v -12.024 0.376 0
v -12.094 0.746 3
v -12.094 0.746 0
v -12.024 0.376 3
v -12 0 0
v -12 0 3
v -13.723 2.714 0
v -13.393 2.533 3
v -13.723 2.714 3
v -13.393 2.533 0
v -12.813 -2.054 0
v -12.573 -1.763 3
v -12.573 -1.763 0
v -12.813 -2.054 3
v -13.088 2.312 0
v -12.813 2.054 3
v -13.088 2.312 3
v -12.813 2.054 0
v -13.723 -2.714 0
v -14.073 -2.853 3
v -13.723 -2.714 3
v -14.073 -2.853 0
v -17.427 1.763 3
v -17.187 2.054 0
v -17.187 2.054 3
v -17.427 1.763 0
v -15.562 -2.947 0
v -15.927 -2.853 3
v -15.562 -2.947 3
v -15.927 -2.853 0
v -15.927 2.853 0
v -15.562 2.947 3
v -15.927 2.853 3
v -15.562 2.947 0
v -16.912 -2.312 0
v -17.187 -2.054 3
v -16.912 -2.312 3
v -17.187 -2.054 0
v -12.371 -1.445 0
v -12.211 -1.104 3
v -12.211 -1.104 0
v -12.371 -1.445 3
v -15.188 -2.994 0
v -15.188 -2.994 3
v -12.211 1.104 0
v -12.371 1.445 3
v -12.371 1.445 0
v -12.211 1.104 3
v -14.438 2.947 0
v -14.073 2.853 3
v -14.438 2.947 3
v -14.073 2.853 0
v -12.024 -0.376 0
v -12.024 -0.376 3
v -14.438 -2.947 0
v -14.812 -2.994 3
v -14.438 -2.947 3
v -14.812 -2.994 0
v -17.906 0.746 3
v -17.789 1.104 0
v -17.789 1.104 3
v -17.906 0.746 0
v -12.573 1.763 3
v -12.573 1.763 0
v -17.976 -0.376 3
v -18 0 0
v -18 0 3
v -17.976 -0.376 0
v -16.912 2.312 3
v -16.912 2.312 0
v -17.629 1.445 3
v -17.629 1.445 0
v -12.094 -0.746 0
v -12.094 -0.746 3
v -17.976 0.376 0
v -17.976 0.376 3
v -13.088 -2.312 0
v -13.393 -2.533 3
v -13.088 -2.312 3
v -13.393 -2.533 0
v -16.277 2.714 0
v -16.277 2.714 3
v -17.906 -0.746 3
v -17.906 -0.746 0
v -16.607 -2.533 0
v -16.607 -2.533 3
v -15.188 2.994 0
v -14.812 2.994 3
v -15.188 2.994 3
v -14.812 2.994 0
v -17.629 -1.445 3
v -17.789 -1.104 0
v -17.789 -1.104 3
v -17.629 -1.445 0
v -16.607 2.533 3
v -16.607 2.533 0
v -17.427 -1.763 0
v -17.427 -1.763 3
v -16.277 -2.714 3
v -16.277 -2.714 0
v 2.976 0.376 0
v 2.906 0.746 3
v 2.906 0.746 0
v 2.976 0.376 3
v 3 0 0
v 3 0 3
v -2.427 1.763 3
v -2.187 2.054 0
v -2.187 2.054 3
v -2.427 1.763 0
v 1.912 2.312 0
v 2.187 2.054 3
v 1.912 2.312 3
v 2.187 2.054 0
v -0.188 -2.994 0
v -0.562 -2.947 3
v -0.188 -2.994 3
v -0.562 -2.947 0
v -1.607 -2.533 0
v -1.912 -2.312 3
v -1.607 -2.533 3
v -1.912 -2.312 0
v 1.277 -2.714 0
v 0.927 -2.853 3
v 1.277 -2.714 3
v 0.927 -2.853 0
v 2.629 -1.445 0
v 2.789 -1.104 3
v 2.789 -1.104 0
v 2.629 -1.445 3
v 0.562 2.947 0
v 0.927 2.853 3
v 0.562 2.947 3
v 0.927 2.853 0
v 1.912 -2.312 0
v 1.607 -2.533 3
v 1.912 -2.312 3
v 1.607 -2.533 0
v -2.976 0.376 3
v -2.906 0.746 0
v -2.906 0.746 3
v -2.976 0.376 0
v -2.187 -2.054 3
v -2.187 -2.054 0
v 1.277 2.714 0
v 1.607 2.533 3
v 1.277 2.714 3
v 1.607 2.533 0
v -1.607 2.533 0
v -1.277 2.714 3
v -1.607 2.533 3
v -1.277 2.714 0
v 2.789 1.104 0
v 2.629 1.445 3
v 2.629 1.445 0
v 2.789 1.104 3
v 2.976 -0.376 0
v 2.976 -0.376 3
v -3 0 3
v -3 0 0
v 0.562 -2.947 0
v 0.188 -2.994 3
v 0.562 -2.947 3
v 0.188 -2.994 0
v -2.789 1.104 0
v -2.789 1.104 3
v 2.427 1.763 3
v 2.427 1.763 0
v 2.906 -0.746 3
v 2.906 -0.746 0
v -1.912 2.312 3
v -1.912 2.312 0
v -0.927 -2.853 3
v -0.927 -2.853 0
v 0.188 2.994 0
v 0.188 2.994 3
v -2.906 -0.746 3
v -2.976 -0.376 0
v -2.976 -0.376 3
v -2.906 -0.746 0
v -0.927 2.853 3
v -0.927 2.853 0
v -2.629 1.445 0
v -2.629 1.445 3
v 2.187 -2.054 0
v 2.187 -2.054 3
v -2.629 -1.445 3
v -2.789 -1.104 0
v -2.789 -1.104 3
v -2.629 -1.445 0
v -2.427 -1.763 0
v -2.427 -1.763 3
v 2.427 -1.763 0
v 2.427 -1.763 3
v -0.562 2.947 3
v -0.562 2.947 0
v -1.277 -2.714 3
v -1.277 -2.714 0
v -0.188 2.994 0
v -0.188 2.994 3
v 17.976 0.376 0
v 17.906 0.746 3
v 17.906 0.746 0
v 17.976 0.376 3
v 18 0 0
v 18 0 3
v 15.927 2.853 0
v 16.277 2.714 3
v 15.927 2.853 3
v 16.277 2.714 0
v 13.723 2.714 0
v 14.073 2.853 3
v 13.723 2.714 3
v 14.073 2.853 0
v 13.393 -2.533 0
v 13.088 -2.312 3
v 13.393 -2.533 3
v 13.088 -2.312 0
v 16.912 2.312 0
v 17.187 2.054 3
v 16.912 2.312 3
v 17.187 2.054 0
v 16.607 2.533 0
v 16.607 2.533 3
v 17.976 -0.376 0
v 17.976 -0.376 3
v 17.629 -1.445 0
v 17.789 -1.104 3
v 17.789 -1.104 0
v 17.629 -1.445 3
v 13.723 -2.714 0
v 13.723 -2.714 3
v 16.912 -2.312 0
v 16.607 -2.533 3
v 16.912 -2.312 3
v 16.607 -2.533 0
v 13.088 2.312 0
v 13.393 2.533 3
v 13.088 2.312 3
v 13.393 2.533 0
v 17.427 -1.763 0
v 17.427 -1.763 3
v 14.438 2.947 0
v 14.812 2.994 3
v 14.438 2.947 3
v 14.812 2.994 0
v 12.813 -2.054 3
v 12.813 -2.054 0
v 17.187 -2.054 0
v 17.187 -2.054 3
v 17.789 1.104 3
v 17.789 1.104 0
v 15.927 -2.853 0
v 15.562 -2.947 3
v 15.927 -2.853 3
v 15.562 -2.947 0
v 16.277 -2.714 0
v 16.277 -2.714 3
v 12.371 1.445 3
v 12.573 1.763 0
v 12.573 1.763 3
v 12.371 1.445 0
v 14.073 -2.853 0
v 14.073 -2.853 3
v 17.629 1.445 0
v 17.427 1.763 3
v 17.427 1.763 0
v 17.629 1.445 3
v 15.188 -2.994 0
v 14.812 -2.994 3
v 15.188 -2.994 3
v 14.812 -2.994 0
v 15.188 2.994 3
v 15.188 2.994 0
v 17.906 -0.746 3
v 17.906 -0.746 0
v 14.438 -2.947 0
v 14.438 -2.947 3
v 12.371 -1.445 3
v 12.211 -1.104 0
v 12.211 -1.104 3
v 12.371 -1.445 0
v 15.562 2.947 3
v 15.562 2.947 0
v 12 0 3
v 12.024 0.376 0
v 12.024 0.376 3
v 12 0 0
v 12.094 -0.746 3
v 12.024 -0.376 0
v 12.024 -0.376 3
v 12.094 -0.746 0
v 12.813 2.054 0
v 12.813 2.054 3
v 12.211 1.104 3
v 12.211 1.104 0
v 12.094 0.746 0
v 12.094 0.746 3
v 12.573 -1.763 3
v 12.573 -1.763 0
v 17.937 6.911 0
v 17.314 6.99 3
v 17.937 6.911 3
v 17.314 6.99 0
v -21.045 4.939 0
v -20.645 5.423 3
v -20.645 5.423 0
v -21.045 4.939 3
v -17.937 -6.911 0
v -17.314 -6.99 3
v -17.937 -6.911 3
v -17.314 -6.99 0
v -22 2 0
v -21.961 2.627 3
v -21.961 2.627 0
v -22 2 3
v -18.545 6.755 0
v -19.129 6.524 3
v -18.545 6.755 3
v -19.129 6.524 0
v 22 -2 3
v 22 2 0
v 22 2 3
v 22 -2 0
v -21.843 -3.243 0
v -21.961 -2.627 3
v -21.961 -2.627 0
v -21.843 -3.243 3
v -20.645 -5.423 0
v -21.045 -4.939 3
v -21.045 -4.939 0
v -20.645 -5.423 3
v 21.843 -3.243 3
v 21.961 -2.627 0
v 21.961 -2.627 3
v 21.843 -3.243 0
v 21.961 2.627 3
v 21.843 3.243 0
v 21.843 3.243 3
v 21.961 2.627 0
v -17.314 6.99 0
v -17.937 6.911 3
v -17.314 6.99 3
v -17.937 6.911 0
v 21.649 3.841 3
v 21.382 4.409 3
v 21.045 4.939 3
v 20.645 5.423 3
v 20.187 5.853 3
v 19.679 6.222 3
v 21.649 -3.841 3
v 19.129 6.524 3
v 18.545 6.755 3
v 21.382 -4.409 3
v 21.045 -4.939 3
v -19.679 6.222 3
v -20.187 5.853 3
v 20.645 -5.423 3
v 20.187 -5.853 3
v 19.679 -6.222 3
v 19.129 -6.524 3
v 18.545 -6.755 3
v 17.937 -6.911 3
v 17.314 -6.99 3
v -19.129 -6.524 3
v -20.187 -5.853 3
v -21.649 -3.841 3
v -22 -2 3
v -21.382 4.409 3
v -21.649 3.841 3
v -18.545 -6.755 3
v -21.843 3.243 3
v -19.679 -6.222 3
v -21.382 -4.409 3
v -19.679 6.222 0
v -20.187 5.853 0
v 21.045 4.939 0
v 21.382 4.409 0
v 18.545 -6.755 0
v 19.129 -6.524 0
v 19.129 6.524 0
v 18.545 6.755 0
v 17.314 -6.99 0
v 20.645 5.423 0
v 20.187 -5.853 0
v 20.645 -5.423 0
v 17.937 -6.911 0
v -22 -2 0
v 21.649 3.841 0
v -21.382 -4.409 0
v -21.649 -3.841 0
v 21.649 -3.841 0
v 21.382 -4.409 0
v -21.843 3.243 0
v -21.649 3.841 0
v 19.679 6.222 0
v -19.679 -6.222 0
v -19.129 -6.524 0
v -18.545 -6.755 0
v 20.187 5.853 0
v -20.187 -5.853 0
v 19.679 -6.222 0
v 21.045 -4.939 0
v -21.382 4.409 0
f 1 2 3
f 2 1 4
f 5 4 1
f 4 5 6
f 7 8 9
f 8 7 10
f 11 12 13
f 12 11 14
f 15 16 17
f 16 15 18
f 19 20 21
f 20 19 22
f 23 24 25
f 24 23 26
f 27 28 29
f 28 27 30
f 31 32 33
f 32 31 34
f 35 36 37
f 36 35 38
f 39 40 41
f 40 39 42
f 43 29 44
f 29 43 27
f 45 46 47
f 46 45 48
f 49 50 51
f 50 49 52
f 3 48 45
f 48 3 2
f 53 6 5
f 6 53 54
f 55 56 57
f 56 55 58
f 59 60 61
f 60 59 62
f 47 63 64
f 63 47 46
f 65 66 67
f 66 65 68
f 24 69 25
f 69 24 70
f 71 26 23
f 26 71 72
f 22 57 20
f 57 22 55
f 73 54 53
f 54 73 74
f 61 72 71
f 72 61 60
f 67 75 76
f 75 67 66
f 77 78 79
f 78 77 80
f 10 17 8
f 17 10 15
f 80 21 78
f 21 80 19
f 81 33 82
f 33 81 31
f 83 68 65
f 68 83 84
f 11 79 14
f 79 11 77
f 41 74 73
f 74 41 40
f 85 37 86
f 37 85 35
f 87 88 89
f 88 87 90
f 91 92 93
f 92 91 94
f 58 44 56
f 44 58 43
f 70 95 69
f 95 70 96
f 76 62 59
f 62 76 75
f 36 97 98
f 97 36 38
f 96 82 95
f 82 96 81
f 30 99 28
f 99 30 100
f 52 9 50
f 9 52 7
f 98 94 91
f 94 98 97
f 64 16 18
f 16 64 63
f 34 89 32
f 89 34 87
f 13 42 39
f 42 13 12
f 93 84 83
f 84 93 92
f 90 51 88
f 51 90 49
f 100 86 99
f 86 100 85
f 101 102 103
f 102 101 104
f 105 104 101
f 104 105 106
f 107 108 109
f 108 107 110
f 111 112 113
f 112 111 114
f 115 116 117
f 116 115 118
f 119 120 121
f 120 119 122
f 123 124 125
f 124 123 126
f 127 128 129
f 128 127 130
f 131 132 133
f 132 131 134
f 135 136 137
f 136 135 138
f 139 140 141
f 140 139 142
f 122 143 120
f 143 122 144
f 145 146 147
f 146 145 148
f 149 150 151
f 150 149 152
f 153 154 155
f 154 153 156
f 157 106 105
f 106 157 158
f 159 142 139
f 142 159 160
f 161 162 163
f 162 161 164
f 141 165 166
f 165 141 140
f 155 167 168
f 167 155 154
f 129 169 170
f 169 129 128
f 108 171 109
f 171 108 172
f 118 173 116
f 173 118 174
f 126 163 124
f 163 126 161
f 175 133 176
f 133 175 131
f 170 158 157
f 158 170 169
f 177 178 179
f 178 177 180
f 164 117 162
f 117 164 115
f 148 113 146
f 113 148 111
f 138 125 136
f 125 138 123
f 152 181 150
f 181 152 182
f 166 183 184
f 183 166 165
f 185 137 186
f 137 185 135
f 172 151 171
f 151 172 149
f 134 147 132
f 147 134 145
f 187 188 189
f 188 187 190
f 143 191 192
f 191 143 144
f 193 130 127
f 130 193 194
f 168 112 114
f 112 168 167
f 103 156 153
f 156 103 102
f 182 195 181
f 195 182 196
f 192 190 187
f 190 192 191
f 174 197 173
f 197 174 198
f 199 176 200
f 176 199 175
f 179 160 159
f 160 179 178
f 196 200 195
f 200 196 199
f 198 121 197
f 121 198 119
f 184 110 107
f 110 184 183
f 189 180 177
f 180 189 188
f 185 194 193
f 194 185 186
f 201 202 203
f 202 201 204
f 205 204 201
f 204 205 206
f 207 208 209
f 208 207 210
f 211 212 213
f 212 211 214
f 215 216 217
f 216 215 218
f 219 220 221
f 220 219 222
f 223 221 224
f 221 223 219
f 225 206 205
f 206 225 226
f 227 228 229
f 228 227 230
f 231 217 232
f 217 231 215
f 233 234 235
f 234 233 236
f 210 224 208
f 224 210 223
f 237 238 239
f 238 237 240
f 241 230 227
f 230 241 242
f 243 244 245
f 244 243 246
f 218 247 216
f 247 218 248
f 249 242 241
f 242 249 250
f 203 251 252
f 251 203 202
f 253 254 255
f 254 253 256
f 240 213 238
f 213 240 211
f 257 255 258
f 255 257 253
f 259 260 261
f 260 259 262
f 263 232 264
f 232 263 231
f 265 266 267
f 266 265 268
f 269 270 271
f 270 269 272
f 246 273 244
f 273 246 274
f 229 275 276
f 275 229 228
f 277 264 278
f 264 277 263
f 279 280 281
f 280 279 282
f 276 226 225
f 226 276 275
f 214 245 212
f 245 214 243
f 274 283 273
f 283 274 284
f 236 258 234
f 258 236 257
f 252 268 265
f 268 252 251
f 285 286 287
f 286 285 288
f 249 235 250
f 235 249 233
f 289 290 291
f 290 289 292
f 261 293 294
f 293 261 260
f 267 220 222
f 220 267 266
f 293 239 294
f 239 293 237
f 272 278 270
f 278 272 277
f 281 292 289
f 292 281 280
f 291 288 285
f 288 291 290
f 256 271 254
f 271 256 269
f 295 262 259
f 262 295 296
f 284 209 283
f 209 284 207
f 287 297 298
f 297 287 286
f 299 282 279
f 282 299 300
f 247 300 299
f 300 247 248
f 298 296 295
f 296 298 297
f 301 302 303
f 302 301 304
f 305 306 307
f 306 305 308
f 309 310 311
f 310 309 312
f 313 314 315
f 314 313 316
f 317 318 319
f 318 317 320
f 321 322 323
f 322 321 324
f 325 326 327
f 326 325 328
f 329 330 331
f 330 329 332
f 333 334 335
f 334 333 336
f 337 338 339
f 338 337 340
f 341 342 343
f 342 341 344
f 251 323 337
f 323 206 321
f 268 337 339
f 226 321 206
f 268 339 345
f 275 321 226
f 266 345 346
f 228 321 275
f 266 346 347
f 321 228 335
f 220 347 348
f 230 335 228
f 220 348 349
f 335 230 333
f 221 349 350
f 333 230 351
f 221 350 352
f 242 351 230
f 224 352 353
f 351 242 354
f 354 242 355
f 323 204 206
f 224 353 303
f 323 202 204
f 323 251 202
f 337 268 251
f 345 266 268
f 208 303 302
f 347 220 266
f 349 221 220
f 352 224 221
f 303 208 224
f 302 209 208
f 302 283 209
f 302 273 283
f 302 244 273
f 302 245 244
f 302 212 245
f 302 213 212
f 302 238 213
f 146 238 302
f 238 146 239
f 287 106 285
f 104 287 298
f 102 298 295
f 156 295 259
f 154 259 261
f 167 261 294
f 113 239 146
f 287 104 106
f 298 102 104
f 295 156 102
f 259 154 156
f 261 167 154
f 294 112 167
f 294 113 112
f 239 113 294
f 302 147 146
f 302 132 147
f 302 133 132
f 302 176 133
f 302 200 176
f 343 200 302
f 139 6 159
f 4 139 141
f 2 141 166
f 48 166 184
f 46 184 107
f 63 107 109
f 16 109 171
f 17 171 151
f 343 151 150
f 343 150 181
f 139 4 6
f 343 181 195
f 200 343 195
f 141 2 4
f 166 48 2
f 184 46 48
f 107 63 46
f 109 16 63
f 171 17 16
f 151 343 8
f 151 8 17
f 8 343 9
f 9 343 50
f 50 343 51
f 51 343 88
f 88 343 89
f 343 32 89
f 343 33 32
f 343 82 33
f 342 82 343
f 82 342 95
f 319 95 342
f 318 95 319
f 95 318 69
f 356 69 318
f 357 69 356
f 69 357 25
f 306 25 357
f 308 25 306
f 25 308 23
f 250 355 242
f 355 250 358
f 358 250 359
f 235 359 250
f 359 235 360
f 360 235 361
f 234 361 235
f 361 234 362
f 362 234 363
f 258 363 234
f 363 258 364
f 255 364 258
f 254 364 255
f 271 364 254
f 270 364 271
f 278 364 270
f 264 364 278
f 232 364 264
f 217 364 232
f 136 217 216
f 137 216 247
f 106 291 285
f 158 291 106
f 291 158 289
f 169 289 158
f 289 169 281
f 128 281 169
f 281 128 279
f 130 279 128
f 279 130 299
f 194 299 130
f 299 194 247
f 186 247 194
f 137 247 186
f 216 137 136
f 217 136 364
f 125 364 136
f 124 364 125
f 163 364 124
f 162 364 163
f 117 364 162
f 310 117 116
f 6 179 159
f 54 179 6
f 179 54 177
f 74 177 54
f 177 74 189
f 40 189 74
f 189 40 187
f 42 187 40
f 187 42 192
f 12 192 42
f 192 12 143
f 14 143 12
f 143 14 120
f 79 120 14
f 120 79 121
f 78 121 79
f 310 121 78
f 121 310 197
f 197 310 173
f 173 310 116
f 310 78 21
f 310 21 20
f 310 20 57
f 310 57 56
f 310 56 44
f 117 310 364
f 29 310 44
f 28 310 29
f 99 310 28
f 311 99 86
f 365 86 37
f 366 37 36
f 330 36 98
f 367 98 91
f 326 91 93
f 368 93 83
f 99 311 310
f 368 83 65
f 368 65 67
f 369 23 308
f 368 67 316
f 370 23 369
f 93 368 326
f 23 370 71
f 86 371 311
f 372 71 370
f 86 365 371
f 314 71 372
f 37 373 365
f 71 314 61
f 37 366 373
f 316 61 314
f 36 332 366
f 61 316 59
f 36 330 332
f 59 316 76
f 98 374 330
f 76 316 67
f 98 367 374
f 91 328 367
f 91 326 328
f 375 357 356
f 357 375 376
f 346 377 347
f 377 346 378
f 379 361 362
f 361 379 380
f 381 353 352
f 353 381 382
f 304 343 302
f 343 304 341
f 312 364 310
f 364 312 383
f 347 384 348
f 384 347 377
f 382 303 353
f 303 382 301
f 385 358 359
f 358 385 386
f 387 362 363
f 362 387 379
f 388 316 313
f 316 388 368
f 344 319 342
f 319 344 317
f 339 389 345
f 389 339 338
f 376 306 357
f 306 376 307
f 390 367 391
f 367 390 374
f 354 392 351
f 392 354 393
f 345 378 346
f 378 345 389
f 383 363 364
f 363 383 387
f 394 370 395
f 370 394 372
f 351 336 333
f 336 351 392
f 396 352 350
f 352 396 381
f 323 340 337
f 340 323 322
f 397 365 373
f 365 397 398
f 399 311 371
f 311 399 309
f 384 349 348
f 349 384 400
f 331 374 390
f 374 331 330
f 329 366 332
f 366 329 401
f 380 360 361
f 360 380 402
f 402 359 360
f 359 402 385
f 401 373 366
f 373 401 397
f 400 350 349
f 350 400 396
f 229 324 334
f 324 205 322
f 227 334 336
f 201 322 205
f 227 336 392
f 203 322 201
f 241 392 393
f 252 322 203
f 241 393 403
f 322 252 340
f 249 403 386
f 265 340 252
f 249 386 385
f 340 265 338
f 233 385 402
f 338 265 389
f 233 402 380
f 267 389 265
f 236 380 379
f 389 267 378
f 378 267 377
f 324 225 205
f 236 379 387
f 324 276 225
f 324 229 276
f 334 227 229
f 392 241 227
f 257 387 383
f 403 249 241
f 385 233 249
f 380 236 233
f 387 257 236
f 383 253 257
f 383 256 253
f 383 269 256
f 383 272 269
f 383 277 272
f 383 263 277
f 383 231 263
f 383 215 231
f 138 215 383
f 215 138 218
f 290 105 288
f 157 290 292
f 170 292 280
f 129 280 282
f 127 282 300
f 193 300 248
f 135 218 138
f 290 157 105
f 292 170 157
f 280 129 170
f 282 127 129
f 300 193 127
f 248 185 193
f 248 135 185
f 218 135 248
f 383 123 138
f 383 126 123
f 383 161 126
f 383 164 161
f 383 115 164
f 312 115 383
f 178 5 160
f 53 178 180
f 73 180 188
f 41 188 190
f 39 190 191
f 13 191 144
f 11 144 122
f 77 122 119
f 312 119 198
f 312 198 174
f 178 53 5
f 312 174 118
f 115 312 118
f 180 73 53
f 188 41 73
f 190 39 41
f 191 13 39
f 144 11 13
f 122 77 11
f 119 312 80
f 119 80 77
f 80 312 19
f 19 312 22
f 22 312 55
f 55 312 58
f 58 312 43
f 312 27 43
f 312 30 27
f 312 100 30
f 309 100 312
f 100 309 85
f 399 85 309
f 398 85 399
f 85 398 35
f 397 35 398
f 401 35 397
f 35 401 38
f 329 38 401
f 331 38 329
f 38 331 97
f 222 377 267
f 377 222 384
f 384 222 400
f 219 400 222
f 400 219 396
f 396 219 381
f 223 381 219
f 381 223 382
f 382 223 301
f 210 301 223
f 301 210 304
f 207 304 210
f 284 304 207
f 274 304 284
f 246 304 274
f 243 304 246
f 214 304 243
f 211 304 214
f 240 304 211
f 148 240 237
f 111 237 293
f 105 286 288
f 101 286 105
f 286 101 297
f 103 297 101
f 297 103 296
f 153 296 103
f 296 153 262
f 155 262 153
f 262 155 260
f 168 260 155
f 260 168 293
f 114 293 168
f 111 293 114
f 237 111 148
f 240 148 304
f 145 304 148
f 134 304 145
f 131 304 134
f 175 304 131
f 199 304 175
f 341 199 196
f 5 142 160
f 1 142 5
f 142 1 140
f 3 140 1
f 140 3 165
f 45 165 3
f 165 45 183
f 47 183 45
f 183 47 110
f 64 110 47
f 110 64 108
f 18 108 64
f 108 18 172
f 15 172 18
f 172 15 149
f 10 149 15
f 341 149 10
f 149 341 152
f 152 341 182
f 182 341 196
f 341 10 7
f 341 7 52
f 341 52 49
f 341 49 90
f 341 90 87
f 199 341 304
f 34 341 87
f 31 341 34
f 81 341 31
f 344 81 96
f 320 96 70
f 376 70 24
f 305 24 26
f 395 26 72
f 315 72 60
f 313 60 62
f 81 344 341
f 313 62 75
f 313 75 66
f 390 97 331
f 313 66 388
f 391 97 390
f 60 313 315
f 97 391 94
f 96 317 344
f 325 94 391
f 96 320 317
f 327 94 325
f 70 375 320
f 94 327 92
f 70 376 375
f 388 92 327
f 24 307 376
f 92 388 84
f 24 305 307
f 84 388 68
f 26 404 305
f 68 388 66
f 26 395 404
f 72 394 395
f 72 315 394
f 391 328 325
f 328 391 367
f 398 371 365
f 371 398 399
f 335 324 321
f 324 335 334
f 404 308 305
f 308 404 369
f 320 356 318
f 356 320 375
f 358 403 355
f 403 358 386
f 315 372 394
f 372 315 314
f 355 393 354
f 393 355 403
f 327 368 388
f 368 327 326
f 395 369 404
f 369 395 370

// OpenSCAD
// Generated by SolidPython 1.1.3 on 2023-03-12 21:51:23
$fn = 50;


difference() {
	union() {
		translate(v = [0, 0, 0]) {
			rotate(a = [0, 0, 0]) {
				hull() {
					translate(v = [-17.0000000000, 2.0000000000, 0]) {
						rotate(a = [0, 0, 0]) {
							translate(v = [0, 0, 0]) {
								rotate(a = [0, 0, 0]) {
									cylinder(h = 3, r = 5);
								}
							}
						}
					}
					translate(v = [17.0000000000, 2.0000000000, 0]) {
						rotate(a = [0, 0, 0]) {
							translate(v = [0, 0, 0]) {
								rotate(a = [0, 0, 0]) {
									cylinder(h = 3, r = 5);
								}
							}
						}
					}
					translate(v = [-17.0000000000, -2.0000000000, 0]) {
						rotate(a = [0, 0, 0]) {
							translate(v = [0, 0, 0]) {
								rotate(a = [0, 0, 0]) {
									cylinder(h = 3, r = 5);
								}
							}
						}
					}
					translate(v = [17.0000000000, -2.0000000000, 0]) {
						rotate(a = [0, 0, 0]) {
							translate(v = [0, 0, 0]) {
								rotate(a = [0, 0, 0]) {
									cylinder(h = 3, r = 5);
								}
							}
						}
					}
				}
			}
		}
	}
	union() {
		translate(v = [-15.0000000000, 0.0000000000, 0]) {
			rotate(a = [0, 0, 0]) {
				translate(v = [0, 0, -50]) {
					rotate(a = [0, 0, 0]) {
						cylinder(h = 100, r = 3.0000000000);
					}
				}
			}
		}
		translate(v = [0.0000000000, 0.0000000000, 0]) {
			rotate(a = [0, 0, 0]) {
				translate(v = [0, 0, -50]) {
					rotate(a = [0, 0, 0]) {
						cylinder(h = 100, r = 3.0000000000);
					}
				}
			}
		}
		translate(v = [15.0000000000, 0.0000000000, 0]) {
			rotate(a = [0, 0, 0]) {
				translate(v = [0, 0, -50]) {
					rotate(a = [0, 0, 0]) {
						cylinder(h = 100, r = 3.0000000000);
					}
				}
			}
		}
	}
}
/***********************************************
*********      SolidPython code:      **********
************************************************
 
from solid import *
import os
import subprocess

import oomB

import opsc_library_gen

mode = "laser"
#mode = "3d_print"

defined_objects = {}

radius_dict = {}
countersunk_dict = {}


def set_mode(m):
    global mode
    mode = m
    radius_dict['M6'] = 6.5/2
    radius_dict['M3'] = 3.3/2
    if mode == "laser":
        radius_dict['M6'] = 6/2
        radius_dict['M3'] = 3/2

    countersunk_dict['M3'] = {}
    countersunk_dict['M3']['little_rad'] = radius_dict['M3']
    countersunk_dict['M3']['big_rad'] = (5.5+0.6)/2
    if mode == "laser":
        countersunk_dict['M3']['big_rad'] = (4.75+0.6)/2
        countersunk_dict['M3']['little_rad'] = (4.75+0.6)/2

    countersunk_dict['M3']['height'] = 1.7


def opsc_make_object(filename, objects, save_type="none",resolution=50, layers = 1, tilediff = 200, mode="laser", overwrite=True):
    if overwrite or not os.path.exists(filename):
        set_mode(mode)
        save_type = save_type.lower()
        os.makedirs(os.path.dirname(filename), exist_ok=True)
        final_object = opsc_get_object(objects, mode = mode)
        # Save the final object to the specified filename    
        scad_render_to_file(final_object, filename, file_header='$fn = %s;' % resolution, include_orig_code=True)
        if mode == "laser":
            filename_laser = filename.replace(".scad","-flat.scad")
            scad_render_to_file(getLaser(final_object, layers=layers, tilediff=tilediff), filename_laser, file_header='$fn = %s;' % resolution, include_orig_code=True)
            if save_type == "all":
                saveToAll(filename_laser)
            elif save_type == "dxf":
                saveToDxf(filename_laser)
        if save_type == "all":
            saveToAll(filename)
        elif save_type == "dxf":
            saveToDxf(filename)


def opsc_get_object(objects, mode = "laser"):
    # Create the solidpython objects only include the positive objects and if they don't have inclusion or their inclusion is either all or mode
    # Initialize an empty list to store the results
    positive_objects = []

    # Iterate over the "objects" list
    for obj in objects:
        # Check if the current object has a "type" key with a value of "positive"
        if obj['type'] == 'positive':
            # Check if the current object has an "inclusion" key and its value matches "mode",
            # or if the current object does not have an "inclusion" key at all
            if not 'inclusion' in obj or obj['inclusion'] == "all" or obj['inclusion'] == mode:
                # Call the "get_opsc_item" function with the current object as an argument
                opsc_item = get_opsc_item(obj)
                # Add the result to the "positive_objects" list
                positive_objects.append(opsc_item)
# Initialize an empty list to store the results
    negative_objects = []

    # Iterate over the "objects" list
    for obj in objects:
        # Check if the current object has a "type" key with a value of "negative"
        if obj['type'] == 'negative':
            # Check if the current object has an "inclusion" key and its value matches "mode",
            # or if the current object does not have an "inclusion" key at all
            if not 'inclusion' in obj or obj['inclusion'] == "all" or obj['inclusion'] == mode:
                # Call the "get_opsc_item" function with the current object as an argument
                opsc_item = get_opsc_item(obj)
                # Add the result to the "negative_objects" list
                negative_objects.append(opsc_item)
    
    #positive_objects = [get_opsc_item(obj) for obj in objects if obj['type'] == 'positive']
    #negative_objects = [get_opsc_item(obj) for obj in objects if obj['type'] == 'negative']
    # Union the positive objects
    positive_object = union()(*positive_objects)
    # Union the negative objects
    negative_object = union()(*negative_objects)
    # Create the final object by subtracting the negative objects from the positive objects
    return difference()(positive_object, negative_object)

def get_opsc_item(params):
    # A dictionary to map radius string values to numerical values
    #radius_dict = {'small': 5, 'medium': 10, 'large': 15}
    # An array of function names for basic shapes
    basic_shapes = ['cube', 'sphere', 'cylinder']
    
    # An array of function names for other shapes
    other_shapes = ['hole', 'slot', 'rounded_rectangle', 'countersunk']
    


    # Convert radius to r if present, and remove radius from the params dictionary
    if 'radius' in params:
        if isinstance(params['radius'], str):
            # Use the radius_dict to map the radius string value to a numerical value
            params['r'] = radius_dict[params['radius']]
        else:
            params['r'] = params['radius']
        del params['radius']
    

    # Check if the object type is a basic shape
    if params['shape'] in basic_shapes:
        # Remove shape and unexpected dictionary values
        allowed_keys = {'size', 'r', 'r1', 'r2', 'd', 'h', 'rw', 'rh', 'dw', 'dh'}
        shape_params = {k: v for k, v in params.items() if k in allowed_keys}

        # Call the corresponding function for the shape parameter, using ** notation to pass the shape_params dictionary as keyword arguments
        return get_opsc_transform(params,globals()[params['shape']](**shape_params))
    
    # If the object type is not a basic shape, check if it's a defined object or one of the other shapes
    elif params['shape'] in other_shapes:
        # Call the corresponding function for the shape parameter, passing the params dictionary as an argument
        p2 = copy.deepcopy(params)
        p2["pos"] = [0,0,0]
        return get_opsc_transform(params,globals()[params['shape']](p2))
    
    # If the object is not a basic shape or a defined object, try to import it from a .scad file
    else:
        obj = defined_objects[params['shape']]
        return get_opsc_transform(params,obj)

def get_opsc_transform(params, solid_obj):
    # Rotate the object based on the 'rot' field in the params dictionary, or the 'rotX', 'rotY', and 'rotZ' fields if 'rot' is not present
    rot = params.get('rot', [])
    if rot:
        rotX, rotY, rotZ = rot
    else:
        rotX = params.get('rotX', 0)
        rotY = params.get('rotY', 0)
        rotZ = params.get('rotZ', 0)
    solid_obj = rotate([rotX, rotY, rotZ])(solid_obj)

    # Translate the object based on the 'pos' field in the params dictionary, or the 'x', 'y', and 'z' fields if 'pos' is not present
    pos = params.get('pos', [])
    if pos:
        x, y, z = pos
    else:
        x = params.get('x', 0)
        y = params.get('y', 0)
        z = params.get('z', 0)
    solid_obj = translate([x, y, z])(solid_obj)
    return solid_obj


import random

def opsc_easy_array(type, shape, repeats, pos_start, shift_arr, **kwargs):
    for i in range(0,3):
        repeats.append(1)
        pos_start.append(0)
        shift_arr.append(0)
    return_objects = []

    for x in range(0,repeats[0]):
        for y in range(0,repeats[1]):
            for z in range(0,repeats[2]):
                return_objects.append(opsc_easy(type, shape, pos=[pos_start[0]+x*shift_arr[0],pos_start[1]+y*shift_arr[1],pos_start[2]+z*shift_arr[2]], **kwargs))
    return return_objects                



def opsc_easy(type, shape, **kwargs):
    obj = {
        'type': type,
        'shape': shape
    }
    for param in ['size', 'r', 'r1', 'r2', 'd', 'h', 'rw', 'rh', 'dw', 'dh', 'pos', 'x', 'y', 'z', 'rot', 'rotX', 'rotY', 'rotZ', "w", "inclusion"]:
        if param in kwargs:
            obj[param] = kwargs[param]
    return obj

def hole(params):
    p2 = copy.deepcopy(params)  
    # Check if the radius is a string and replace it with the corresponding value from the dictionary
    if isinstance(p2['r'], str):
        p2['r'] = radius_dict[p2['r']]
    
    # Set the height to 100 if not specified
    if 'h' not in p2:
        p2['h'] = 100
        p2["pos"] = [0,0,-50]
    p2["center"] = True
    # Create the cylinder object
    p2["shape"] = "cylinder"
    p2["type"] = "positive"

    return get_opsc_item(p2)

import copy

def countersunk(params):
    p2 = copy.deepcopy(params)
    counter_rad = p2['r']
    p2['r'] = radius_dict[p2['r']]
    hp = copy.deepcopy(p2)
    hp["type"] = "positive"
    hp["shape"] = "hole"
    del hp["rot"]
    hol = get_opsc_item(hp)
    
    cp = copy.deepcopy(p2)
    cp["h"] = countersunk_dict[counter_rad]["height"]
    cp["r2"] = countersunk_dict[counter_rad]["little_rad"]
    cp["r1"] = countersunk_dict[counter_rad]["big_rad"]
    del cp["r"]
    del cp["rot"]
    cp["type"] = "positive"
    cp["shape"] = "cylinder"
    cp["pos"] = [0,0,0]

    top = get_opsc_item(cp)
    return union()(hol,top)



def slot(params):  
    p2 = copy.deepcopy(params) 
    if isinstance(p2['r'], str):
        p2['r'] = radius_dict[p2['r']]
    p2["type"] = "positive"
    p2["shape"] = "hole"
    del p2["rot"]
    p2["pos"] = [0,0,0]
    left = copy.deepcopy(p2)
    right = copy.deepcopy(p2)
    left["pos"][0] = p2["w"] / 2 - p2["r"] 
    
    right["pos"][0] = -p2["w"] / 2 + p2["r"] 
    pass
    leftObj = get_opsc_item(left)
    rightObj = get_opsc_item(right)
    return hull()(leftObj, rightObj)

def rounded_rectangle(params):   
    p2 = copy.deepcopy(params) 
    p2["h"] = p2["size"][2]
    p2["pos"] = p2.get("pos", [0, 0, 0]) 
    p2["type"] = "positive"
    p2["shape"] = "hole"
    p2["pos"] = [0,0,0]
    
    if 'rot' in p2:
        del p2["rot"]   
    if 'r' not in p2:
        p2["r"] = 5 
    tl = copy.deepcopy(p2)
    tr = copy.deepcopy(p2)
    bl = copy.deepcopy(p2)
    br = copy.deepcopy(p2)
    tl["pos"][0] = -(p2["size"][0] - p2["r"]*2)/2
    tl["pos"][1] = (p2["size"][1] - p2["r"]*2)/2
    tr["pos"][0] = (p2["size"][0] - p2["r"]*2)/2
    tr["pos"][1] = (p2["size"][1] - p2["r"]*2)/2
    bl["pos"][0] = -(p2["size"][0] - p2["r"]*2)/2
    bl["pos"][1] = -(p2["size"][1] - p2["r"]*2)/2
    br["pos"][0] = (p2["size"][0] - p2["r"]*2)/2
    br["pos"][1] = -(p2["size"][1] - p2["r"]*2)/2
    del tl["size"]
    del tr["size"]
    del bl["size"]
    del br["size"]
    tlo = get_opsc_item(tl)
    tro = get_opsc_item(tr)
    blo = get_opsc_item(bl)
    bro = get_opsc_item(br)    
    return hull()(tlo, tro, blo, bro)



def import_scad_object(filename):
    # Import the .scad file and convert it to a solidpython object
    #filename = "parts"
    obj = import_scad(filename)
    return obj.main()
    


import os
import solid as solidpython

# A dictionary to store the defined objects


def load_scad_objects():
    opsc_library_gen.gen_library(defined_objects)

import random

def test(num_objects):
    objects = []
    for i in range(num_objects):
        # Choose a random shape
        #shape = random.choice(['cube', 'sphere', 'cylinder', 'hole', 'slot', "rounded_rectangle"])
        shape = random.choice(["rounded_rectangle"])

        # Choose a random type
        type = random.choice(['positive', 'negative'])
        
        # Create an empty object dictionary
        obj = {'shape': shape, 'type': type}
        
        # Set shape-specific parameters
        if obj['shape'] in ['cube']:
            obj['size'] =  [random.uniform(5, 15), random.uniform(5, 15), random.uniform(5, 15)]
        if obj['shape'] in ['rounded_rectangle']:
            obj['size'] =  [random.uniform(5, 15), random.uniform(5, 15), random.uniform(5, 15)]
            obj['r'] = random.uniform(0.5, 5)
        elif obj['shape'] == 'sphere':
            obj['r'] = random.uniform(5, 15)
        elif obj['shape'] in ['cylinder', 'hole']:
            obj['r'] = random.uniform(0.5, 5)
            obj['h'] = random.uniform(5, 15)
        elif obj['shape'] == 'slot':
            obj['r'] = random.uniform(0.5, 5)
            obj['h'] = random.uniform(5, 15)
            obj['w'] = random.uniform(5, 15)
        
        # Set a random position and rotation
        obj['pos'] = [random.uniform(-20, 20), random.uniform(-20, 20), random.uniform(-20, 20)]
        obj['rot'] = [random.uniform(-180, 180), random.uniform(-180, 180), random.uniform(-180, 180)]
        
        # Add the object to the list
        objects.append(obj)
    return objects

####### old file saving
def saveToAll(fileIn):
    saveToDxf(fileIn)
    saveToPng(fileIn)
    saveToStl(fileIn)
    saveToSvg(fileIn)

def saveToDxf(fileIn, fileOut="", copy_to_laser=True):
    if fileOut == "":
        fileOut = fileIn.replace(".scad",".dxf")
    saveToFile(fileIn, fileOut)


    
def saveToPng(fileIn, fileOut="",extra="--render"):
    if fileOut == "":
        fileOut = fileIn.replace(".scad",".png")
    saveToFile(fileIn, fileOut)

def saveToStl(fileIn, fileOut=""):
    if fileOut == "":
        fileOut = fileIn.replace(".scad",".stl")
    saveToFile(fileIn, fileOut)
    
def saveToSvg(fileIn, fileOut=""):
    if fileOut == "":
        fileOut = fileIn.replace(".scad",".svg")
    saveToFile(fileIn, fileOut)

def saveToFile(fileIn, fileOut,extra=""):
    #extra = extra + " --colorscheme Tomorrow"

    launchStr = 'openscad -o "' + fileOut + '"' + extra + ' "' + fileIn + '"'
    if ".png" in fileOut:
        launchStr = launchStr + " --render"
    print("            saveToFile launch string: " + launchStr)
    subprocess.run(launchStr)
    x=0

def getLaser(final_object,start=1.5,layers=1,thickness=3,tilediff=200):
        rv= []

        for x in range(layers):
            rv.append(translate([0,x*tilediff,0])(
                    projection()(
                        intersection()(translate([-500,-500,start+x*thickness])(cube(size=[1000,1000,0.1])),
                            final_object
                        )
                    )
            )
            )
            
        return union()(rv)

set_mode("laser")
load_scad_objects() 
 
************************************************/
